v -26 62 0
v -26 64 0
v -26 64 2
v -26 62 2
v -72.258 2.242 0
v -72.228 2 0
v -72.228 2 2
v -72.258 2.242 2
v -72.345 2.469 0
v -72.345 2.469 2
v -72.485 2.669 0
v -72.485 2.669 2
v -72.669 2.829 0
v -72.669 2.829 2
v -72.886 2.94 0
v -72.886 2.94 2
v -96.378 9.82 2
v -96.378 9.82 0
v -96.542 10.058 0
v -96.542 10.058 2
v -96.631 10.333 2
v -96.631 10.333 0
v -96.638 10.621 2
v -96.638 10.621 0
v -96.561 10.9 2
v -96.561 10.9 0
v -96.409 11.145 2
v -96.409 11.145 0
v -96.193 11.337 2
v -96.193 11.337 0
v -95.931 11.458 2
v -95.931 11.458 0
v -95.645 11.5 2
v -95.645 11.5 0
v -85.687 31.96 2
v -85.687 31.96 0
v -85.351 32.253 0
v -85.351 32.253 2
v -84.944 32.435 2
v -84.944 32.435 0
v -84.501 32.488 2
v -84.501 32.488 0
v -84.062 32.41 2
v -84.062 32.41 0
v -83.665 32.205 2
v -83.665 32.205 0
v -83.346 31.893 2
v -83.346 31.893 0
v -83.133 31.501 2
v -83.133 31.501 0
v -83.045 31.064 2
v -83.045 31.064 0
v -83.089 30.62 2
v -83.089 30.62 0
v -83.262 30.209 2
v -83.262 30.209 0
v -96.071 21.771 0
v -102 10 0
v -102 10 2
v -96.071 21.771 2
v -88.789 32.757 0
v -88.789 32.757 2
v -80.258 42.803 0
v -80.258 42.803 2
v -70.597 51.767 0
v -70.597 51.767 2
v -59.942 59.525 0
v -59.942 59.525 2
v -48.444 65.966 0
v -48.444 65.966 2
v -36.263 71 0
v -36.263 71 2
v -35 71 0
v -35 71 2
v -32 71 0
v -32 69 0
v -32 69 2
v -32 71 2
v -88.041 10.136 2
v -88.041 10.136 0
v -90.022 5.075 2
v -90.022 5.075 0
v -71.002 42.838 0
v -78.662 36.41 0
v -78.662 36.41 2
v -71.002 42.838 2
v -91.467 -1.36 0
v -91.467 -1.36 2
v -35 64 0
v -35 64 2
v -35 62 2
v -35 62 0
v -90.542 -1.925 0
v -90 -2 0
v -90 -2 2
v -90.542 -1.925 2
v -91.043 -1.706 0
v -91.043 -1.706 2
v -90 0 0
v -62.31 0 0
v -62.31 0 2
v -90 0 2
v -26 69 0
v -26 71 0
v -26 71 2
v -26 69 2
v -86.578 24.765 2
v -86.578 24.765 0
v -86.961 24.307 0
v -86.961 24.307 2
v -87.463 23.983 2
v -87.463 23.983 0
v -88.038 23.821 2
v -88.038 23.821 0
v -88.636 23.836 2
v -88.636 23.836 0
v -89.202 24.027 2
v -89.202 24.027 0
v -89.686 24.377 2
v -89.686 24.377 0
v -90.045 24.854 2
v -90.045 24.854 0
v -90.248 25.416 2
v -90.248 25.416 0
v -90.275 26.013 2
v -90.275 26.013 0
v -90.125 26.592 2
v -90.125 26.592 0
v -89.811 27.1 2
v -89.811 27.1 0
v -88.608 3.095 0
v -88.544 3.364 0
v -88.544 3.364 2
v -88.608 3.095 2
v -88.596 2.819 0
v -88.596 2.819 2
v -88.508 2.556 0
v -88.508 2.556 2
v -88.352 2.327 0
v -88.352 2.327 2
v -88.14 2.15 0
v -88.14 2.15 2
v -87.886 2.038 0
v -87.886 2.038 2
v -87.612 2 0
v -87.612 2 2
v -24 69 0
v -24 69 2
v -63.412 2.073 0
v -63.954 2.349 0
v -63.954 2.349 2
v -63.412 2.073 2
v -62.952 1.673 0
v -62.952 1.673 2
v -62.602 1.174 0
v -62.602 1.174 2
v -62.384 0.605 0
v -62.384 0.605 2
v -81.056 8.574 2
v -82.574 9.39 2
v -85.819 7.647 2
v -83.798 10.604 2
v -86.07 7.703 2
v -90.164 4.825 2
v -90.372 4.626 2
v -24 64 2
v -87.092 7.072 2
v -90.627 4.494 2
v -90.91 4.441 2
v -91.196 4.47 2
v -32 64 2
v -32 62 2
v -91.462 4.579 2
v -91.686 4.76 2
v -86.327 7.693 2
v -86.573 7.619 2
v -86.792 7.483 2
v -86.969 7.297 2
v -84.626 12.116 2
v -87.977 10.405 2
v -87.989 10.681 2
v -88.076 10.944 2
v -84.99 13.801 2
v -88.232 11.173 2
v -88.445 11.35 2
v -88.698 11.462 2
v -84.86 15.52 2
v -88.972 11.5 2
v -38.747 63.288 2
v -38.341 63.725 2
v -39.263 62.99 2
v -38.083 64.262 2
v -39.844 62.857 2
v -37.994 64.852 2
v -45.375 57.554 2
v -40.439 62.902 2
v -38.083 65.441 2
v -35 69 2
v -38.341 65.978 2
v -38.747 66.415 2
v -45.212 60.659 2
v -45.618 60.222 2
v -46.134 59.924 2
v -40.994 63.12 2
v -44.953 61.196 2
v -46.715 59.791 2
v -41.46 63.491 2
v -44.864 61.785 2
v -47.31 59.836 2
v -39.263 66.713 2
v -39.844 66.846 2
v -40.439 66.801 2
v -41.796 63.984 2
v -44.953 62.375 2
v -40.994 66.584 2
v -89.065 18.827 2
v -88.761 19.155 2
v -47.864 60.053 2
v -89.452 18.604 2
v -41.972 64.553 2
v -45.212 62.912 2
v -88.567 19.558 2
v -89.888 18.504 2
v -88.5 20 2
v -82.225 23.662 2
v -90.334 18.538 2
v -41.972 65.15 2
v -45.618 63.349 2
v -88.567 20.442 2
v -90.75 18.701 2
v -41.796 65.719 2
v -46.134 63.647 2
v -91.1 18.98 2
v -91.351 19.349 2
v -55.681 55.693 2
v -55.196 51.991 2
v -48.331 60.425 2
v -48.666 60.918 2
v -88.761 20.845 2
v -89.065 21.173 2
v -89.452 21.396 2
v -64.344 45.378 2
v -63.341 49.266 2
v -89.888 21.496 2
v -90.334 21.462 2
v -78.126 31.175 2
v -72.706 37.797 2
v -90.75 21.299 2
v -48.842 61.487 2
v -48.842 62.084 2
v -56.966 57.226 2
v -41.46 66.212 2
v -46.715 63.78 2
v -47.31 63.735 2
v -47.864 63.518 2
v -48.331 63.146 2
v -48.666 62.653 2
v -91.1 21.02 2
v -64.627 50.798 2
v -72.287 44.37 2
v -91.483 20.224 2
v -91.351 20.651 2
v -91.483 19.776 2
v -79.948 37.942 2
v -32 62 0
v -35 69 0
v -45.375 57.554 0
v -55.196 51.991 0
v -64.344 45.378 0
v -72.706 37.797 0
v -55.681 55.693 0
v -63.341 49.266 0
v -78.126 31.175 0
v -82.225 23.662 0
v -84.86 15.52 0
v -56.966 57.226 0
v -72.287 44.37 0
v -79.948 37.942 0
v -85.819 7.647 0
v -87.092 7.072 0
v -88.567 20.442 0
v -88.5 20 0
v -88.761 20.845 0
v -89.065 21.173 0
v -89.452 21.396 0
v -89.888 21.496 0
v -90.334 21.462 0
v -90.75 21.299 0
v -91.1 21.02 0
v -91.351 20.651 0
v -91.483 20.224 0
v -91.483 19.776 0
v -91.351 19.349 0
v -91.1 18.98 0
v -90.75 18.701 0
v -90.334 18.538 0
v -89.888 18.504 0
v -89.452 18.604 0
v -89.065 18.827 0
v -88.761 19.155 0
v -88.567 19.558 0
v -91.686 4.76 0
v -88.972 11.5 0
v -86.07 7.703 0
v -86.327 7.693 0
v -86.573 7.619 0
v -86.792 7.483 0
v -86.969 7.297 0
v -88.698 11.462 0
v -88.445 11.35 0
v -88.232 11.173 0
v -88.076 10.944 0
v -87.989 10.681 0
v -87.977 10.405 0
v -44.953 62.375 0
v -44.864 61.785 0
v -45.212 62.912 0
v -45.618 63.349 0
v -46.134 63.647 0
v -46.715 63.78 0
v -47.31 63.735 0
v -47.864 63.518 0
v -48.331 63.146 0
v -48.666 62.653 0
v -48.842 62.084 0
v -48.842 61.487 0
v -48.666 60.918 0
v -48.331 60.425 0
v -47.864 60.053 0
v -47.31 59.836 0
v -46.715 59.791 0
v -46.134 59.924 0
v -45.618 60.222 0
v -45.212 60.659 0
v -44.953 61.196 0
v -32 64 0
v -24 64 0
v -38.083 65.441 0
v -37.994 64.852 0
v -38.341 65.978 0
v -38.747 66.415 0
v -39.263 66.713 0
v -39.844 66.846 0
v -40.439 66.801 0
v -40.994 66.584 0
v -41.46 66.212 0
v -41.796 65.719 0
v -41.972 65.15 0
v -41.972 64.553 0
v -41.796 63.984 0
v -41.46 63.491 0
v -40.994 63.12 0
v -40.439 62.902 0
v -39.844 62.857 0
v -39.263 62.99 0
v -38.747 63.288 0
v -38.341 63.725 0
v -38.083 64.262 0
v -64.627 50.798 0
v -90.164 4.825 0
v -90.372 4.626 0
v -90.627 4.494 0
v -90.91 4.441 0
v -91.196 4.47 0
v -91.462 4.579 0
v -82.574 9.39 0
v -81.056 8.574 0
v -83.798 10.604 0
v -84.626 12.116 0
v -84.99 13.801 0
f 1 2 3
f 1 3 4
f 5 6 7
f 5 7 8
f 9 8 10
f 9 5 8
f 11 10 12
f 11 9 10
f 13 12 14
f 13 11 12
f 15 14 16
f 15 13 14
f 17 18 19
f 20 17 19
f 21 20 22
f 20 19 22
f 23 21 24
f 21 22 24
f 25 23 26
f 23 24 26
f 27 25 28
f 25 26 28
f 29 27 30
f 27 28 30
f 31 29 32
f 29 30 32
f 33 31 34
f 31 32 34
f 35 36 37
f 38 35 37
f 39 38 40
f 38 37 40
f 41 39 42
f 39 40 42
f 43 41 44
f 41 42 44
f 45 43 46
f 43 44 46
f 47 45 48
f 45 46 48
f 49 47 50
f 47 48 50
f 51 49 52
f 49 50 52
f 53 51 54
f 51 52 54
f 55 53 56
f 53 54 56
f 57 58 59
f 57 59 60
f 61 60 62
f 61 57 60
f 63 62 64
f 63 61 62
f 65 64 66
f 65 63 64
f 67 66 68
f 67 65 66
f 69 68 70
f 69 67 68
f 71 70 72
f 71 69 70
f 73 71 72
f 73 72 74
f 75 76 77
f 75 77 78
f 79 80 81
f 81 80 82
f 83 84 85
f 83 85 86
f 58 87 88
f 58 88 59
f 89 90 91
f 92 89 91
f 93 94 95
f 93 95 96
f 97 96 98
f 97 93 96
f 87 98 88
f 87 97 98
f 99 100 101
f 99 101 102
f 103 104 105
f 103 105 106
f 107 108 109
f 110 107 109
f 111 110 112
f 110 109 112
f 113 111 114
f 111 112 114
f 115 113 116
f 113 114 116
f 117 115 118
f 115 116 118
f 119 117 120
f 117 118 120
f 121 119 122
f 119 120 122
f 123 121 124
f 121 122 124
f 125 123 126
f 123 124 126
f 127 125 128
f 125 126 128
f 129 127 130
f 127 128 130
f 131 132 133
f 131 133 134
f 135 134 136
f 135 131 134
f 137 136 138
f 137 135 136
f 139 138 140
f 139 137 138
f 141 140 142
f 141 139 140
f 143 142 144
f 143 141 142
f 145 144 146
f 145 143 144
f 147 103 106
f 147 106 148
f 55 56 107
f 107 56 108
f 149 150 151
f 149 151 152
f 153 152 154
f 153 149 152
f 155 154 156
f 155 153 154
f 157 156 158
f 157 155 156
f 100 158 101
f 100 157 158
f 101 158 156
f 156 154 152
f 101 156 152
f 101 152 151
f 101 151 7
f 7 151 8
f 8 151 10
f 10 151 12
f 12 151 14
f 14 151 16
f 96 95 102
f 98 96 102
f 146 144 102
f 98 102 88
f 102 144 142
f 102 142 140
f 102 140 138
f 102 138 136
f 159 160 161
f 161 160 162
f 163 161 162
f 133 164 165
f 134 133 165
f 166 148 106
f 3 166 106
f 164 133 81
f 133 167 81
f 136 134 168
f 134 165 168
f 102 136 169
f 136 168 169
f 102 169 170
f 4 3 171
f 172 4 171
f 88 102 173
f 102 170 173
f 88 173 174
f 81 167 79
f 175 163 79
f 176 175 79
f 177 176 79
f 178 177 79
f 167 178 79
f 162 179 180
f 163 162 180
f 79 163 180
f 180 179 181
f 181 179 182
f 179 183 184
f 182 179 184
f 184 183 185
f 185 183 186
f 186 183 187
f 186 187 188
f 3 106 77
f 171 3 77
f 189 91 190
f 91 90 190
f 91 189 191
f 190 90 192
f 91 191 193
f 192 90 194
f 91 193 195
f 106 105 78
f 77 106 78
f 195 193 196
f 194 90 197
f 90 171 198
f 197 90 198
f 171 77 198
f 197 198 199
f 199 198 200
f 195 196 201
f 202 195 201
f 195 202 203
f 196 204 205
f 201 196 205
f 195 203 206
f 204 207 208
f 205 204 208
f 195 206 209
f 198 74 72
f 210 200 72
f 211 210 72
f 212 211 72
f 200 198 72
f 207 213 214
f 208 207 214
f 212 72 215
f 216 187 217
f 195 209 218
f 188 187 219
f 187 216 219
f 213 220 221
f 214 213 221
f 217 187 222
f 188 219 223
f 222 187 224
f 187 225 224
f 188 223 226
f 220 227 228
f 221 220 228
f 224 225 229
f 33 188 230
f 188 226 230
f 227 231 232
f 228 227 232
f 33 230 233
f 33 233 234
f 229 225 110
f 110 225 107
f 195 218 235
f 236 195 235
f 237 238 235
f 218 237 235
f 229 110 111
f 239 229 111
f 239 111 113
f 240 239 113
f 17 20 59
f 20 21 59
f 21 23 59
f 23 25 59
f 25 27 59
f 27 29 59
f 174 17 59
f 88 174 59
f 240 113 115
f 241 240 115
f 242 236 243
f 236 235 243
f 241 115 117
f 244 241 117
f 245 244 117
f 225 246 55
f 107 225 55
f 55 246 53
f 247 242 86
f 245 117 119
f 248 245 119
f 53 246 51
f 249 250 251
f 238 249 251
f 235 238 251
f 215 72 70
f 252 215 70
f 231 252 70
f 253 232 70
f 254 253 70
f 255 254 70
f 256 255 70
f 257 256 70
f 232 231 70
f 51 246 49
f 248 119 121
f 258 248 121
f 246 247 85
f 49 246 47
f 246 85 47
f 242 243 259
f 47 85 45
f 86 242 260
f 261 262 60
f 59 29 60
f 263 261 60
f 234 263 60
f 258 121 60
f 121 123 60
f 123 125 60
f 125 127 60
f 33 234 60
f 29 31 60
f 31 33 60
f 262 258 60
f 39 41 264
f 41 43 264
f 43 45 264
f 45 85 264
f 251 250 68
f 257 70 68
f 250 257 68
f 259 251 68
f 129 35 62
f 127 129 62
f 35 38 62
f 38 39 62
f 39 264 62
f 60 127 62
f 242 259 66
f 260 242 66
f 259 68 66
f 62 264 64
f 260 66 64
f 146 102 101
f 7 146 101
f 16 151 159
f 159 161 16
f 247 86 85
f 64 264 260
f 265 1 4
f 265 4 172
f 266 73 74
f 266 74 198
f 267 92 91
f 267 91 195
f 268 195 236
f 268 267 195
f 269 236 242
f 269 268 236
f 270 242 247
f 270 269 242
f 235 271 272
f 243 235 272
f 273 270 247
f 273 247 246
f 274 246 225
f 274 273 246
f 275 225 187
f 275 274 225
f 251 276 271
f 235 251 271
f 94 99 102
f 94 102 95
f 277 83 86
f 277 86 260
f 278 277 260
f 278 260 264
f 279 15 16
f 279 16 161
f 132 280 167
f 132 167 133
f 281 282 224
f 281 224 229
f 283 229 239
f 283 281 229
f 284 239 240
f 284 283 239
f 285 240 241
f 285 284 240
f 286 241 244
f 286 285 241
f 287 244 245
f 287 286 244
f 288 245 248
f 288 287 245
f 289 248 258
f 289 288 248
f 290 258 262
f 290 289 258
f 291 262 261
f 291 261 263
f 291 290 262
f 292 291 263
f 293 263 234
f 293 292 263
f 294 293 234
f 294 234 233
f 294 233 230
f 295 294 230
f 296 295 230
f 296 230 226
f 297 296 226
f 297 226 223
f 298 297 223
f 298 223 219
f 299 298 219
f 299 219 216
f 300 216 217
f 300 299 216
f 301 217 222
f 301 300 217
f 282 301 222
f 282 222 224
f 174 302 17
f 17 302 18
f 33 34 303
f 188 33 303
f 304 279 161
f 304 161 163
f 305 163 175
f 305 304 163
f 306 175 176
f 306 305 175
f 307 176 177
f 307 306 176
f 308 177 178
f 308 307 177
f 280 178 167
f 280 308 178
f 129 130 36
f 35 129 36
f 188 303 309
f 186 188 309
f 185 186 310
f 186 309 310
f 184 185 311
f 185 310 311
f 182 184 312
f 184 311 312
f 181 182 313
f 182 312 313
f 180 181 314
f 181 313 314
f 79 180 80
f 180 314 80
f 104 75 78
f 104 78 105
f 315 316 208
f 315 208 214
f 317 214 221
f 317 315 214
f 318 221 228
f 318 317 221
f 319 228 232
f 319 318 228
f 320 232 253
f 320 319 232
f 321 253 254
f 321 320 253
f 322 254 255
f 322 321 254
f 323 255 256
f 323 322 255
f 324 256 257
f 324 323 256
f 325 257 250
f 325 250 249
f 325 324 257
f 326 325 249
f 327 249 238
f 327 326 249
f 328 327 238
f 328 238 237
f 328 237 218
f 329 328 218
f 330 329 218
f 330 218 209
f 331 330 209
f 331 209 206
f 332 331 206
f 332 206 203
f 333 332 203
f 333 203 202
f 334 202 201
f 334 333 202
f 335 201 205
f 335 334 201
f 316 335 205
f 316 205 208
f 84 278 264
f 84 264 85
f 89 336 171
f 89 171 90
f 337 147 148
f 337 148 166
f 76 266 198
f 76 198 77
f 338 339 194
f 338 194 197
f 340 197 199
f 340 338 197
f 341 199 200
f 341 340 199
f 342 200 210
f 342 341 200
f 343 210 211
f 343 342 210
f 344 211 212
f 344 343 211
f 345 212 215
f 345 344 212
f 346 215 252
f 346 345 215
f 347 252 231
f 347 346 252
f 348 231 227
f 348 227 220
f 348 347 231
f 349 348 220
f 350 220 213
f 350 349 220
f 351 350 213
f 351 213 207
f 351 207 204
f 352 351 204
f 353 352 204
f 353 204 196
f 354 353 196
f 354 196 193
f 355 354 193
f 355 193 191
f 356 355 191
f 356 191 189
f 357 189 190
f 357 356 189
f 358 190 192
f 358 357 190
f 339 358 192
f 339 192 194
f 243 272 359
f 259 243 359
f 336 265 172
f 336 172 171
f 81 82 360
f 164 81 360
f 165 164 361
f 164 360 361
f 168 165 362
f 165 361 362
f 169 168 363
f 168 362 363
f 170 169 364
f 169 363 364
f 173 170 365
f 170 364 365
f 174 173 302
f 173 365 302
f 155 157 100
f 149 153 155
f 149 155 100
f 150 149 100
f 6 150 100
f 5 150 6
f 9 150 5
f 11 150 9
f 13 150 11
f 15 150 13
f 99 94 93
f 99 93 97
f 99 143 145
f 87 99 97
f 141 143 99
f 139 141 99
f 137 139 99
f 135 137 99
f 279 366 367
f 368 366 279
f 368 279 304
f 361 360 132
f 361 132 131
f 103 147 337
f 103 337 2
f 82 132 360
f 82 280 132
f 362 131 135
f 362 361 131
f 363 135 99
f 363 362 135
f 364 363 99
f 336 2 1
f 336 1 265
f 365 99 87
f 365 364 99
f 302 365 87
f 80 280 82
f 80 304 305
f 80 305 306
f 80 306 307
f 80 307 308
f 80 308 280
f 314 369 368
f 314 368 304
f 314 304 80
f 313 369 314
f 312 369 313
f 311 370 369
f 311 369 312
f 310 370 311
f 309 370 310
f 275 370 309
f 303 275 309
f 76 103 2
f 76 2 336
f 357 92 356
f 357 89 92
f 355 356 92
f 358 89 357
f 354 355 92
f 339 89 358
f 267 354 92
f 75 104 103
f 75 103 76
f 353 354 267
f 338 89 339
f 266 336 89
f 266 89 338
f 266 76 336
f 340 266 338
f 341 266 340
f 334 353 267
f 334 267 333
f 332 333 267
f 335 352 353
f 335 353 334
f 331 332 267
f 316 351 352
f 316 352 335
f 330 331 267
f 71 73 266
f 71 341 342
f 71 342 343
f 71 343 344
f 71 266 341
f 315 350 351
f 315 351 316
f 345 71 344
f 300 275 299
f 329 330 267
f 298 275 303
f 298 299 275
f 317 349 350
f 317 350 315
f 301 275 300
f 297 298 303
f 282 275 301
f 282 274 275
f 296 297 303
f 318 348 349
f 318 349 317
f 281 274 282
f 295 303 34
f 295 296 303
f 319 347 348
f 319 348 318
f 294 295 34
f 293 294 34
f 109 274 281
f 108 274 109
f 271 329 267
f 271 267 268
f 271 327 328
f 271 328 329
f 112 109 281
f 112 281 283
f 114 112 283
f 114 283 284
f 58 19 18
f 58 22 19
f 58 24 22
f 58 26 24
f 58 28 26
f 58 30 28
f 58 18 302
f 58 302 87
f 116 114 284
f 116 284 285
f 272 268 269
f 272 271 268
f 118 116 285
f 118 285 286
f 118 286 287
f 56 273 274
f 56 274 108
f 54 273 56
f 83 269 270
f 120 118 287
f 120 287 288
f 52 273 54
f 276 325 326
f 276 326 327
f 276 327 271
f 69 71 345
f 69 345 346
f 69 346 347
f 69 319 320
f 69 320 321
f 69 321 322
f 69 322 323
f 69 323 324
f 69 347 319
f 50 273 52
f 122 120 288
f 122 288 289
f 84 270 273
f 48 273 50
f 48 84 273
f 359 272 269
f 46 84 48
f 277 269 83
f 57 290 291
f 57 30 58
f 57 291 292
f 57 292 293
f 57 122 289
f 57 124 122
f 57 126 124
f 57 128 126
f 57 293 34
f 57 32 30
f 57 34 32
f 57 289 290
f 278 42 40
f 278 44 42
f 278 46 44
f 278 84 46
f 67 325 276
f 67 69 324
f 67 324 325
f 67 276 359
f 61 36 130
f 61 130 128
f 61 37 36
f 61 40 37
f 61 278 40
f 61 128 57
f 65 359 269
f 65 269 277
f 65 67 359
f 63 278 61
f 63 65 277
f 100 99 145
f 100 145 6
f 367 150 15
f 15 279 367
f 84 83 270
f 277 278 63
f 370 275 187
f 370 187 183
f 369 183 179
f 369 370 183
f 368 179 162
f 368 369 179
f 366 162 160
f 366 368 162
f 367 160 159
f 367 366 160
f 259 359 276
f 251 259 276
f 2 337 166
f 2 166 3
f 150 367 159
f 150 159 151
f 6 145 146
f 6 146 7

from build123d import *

# Parameters (mm, degrees)
SKETCH1_R           = 1.5
SKETCH1_R_2         = 2
BOSS_EXTRUDE1_DEPTH = 2


with BuildPart() as part:
    # Sketch1 → Boss-Extrude1 (new body)
    with BuildSketch(Plane.XY):
        with BuildLine():
            Line((-62.309511, 0), (-90, 0))
            Line((-90, 0), (-90, -2))
            ThreePointArc((-90, -2), (-90.800086058, -1.832992717), (-91.466551917, -1.3598623))
            Line((-91.466551917, -1.3598623), (-102, 10))
            ThreePointArc((-102, 10), (-75.5606337, 47.428438735), (-36.262928729, 71))
            Line((-36.262928729, 71), (-35, 71))
            Line((-35, 71), (-35, 69))
            Line((-35, 69), (-32, 69))
            Line((-32, 69), (-32, 71))
            Line((-32, 71), (-26, 71))
            Line((-26, 71), (-26, 69))
            Line((-26, 69), (-24, 69))
            Line((-24, 69), (-24, 64))
            Line((-24, 64), (-26, 64))
            Line((-26, 64), (-26, 62))
            Line((-26, 62), (-32, 62))
            Line((-32, 62), (-32, 64))
            Line((-32, 64), (-35, 64))
            Line((-35, 64), (-35, 62))
            ThreePointArc((-35, 62), (-55.195926155, 51.990753781), (-72.706011232, 37.797186092))
            ThreePointArc((-72.706011232, 37.797186092), (-80.350726752, 27.513864966), (-84.859723335, 15.519811498))
            ThreePointArc((-84.859723335, 15.519811498), (-84.266660534, 11.330126172), (-81.056134593, 8.573731826))
            Line((-81.056134593, 8.573731826), (-63.954460642, 2.349231552))
            ThreePointArc((-63.954460642, 2.349231552), (-62.76163089, 1.433941091), (-62.309511, 0))
        make_face()
        with Locations((-90, 20)):
            Circle(SKETCH1_R, mode=Mode.SUBTRACT)
        with Locations((-46.864489858, 61.785493015)):
            Circle(SKETCH1_R_2, mode=Mode.SUBTRACT)
        with Locations((-39.993861134, 64.851566266)):
            Circle(SKETCH1_R_2, mode=Mode.SUBTRACT)
        with BuildLine():
            Line((-89.810992251, 27.099684807), (-85.686951519, 31.9596162))
            ThreePointArc((-85.686951519, 31.9596162), (-83.665127869, 32.205193808), (-83.262186445, 30.208767641))
            Line((-83.262186445, 30.208767641), (-86.577972152, 24.765220061))
            ThreePointArc((-86.577972152, 24.765220061), (-89.456863792, 24.184169423), (-89.810992251, 27.099684807))
        make_face(mode=Mode.SUBTRACT)
        with BuildLine():
            Line((-72.886250096, 2.939692621), (-85.819268287, 7.646926281))
            ThreePointArc((-85.819268287, 7.646926281), (-86.572995727, 7.618549798), (-87.092498654, 7.071716197))
            Line((-87.092498654, 7.071716197), (-88.543537199, 3.364482536))
            ThreePointArc((-88.543537199, 3.364482536), (-88.438305951, 2.436299076), (-87.612326975, 2))
            Line((-87.612326975, 2), (-72.228270239, 2))
            ThreePointArc((-72.228270239, 2), (-72.409118195, 2.573576436), (-72.886250096, 2.939692621))
        make_face(mode=Mode.SUBTRACT)
        with BuildLine():
            Line((-95.644910389, 11.5), (-88.972257251, 11.5))
            ThreePointArc((-88.972257251, 11.5), (-88.146278275, 11.063700924), (-88.041047027, 10.135517464))
            Line((-88.041047027, 10.135517464), (-90.021639474, 5.075335561))
            ThreePointArc((-90.021639474, 5.075335561), (-90.766646985, 4.457306749), (-91.686125656, 4.759886947))
            Line((-91.686125656, 4.759886947), (-96.378186348, 9.82006885))
            ThreePointArc((-96.378186348, 9.82006885), (-96.561406748, 10.900043029), (-95.644910389, 11.5))
        make_face(mode=Mode.SUBTRACT)
        Polygon((-78.661971859, 36.409830161), (-71.001527428, 42.837706258), (-72.287102647, 44.369795144), (-79.947547078, 37.941919047), align=None, mode=Mode.SUBTRACT)
        Polygon((-63.341082997, 49.265582354), (-64.626658216, 50.797671241), (-56.966213785, 57.225547337), (-55.680638565, 55.693458451), align=None, mode=Mode.SUBTRACT)
    extrude(amount=BOSS_EXTRUDE1_DEPTH)


solid = part.part
